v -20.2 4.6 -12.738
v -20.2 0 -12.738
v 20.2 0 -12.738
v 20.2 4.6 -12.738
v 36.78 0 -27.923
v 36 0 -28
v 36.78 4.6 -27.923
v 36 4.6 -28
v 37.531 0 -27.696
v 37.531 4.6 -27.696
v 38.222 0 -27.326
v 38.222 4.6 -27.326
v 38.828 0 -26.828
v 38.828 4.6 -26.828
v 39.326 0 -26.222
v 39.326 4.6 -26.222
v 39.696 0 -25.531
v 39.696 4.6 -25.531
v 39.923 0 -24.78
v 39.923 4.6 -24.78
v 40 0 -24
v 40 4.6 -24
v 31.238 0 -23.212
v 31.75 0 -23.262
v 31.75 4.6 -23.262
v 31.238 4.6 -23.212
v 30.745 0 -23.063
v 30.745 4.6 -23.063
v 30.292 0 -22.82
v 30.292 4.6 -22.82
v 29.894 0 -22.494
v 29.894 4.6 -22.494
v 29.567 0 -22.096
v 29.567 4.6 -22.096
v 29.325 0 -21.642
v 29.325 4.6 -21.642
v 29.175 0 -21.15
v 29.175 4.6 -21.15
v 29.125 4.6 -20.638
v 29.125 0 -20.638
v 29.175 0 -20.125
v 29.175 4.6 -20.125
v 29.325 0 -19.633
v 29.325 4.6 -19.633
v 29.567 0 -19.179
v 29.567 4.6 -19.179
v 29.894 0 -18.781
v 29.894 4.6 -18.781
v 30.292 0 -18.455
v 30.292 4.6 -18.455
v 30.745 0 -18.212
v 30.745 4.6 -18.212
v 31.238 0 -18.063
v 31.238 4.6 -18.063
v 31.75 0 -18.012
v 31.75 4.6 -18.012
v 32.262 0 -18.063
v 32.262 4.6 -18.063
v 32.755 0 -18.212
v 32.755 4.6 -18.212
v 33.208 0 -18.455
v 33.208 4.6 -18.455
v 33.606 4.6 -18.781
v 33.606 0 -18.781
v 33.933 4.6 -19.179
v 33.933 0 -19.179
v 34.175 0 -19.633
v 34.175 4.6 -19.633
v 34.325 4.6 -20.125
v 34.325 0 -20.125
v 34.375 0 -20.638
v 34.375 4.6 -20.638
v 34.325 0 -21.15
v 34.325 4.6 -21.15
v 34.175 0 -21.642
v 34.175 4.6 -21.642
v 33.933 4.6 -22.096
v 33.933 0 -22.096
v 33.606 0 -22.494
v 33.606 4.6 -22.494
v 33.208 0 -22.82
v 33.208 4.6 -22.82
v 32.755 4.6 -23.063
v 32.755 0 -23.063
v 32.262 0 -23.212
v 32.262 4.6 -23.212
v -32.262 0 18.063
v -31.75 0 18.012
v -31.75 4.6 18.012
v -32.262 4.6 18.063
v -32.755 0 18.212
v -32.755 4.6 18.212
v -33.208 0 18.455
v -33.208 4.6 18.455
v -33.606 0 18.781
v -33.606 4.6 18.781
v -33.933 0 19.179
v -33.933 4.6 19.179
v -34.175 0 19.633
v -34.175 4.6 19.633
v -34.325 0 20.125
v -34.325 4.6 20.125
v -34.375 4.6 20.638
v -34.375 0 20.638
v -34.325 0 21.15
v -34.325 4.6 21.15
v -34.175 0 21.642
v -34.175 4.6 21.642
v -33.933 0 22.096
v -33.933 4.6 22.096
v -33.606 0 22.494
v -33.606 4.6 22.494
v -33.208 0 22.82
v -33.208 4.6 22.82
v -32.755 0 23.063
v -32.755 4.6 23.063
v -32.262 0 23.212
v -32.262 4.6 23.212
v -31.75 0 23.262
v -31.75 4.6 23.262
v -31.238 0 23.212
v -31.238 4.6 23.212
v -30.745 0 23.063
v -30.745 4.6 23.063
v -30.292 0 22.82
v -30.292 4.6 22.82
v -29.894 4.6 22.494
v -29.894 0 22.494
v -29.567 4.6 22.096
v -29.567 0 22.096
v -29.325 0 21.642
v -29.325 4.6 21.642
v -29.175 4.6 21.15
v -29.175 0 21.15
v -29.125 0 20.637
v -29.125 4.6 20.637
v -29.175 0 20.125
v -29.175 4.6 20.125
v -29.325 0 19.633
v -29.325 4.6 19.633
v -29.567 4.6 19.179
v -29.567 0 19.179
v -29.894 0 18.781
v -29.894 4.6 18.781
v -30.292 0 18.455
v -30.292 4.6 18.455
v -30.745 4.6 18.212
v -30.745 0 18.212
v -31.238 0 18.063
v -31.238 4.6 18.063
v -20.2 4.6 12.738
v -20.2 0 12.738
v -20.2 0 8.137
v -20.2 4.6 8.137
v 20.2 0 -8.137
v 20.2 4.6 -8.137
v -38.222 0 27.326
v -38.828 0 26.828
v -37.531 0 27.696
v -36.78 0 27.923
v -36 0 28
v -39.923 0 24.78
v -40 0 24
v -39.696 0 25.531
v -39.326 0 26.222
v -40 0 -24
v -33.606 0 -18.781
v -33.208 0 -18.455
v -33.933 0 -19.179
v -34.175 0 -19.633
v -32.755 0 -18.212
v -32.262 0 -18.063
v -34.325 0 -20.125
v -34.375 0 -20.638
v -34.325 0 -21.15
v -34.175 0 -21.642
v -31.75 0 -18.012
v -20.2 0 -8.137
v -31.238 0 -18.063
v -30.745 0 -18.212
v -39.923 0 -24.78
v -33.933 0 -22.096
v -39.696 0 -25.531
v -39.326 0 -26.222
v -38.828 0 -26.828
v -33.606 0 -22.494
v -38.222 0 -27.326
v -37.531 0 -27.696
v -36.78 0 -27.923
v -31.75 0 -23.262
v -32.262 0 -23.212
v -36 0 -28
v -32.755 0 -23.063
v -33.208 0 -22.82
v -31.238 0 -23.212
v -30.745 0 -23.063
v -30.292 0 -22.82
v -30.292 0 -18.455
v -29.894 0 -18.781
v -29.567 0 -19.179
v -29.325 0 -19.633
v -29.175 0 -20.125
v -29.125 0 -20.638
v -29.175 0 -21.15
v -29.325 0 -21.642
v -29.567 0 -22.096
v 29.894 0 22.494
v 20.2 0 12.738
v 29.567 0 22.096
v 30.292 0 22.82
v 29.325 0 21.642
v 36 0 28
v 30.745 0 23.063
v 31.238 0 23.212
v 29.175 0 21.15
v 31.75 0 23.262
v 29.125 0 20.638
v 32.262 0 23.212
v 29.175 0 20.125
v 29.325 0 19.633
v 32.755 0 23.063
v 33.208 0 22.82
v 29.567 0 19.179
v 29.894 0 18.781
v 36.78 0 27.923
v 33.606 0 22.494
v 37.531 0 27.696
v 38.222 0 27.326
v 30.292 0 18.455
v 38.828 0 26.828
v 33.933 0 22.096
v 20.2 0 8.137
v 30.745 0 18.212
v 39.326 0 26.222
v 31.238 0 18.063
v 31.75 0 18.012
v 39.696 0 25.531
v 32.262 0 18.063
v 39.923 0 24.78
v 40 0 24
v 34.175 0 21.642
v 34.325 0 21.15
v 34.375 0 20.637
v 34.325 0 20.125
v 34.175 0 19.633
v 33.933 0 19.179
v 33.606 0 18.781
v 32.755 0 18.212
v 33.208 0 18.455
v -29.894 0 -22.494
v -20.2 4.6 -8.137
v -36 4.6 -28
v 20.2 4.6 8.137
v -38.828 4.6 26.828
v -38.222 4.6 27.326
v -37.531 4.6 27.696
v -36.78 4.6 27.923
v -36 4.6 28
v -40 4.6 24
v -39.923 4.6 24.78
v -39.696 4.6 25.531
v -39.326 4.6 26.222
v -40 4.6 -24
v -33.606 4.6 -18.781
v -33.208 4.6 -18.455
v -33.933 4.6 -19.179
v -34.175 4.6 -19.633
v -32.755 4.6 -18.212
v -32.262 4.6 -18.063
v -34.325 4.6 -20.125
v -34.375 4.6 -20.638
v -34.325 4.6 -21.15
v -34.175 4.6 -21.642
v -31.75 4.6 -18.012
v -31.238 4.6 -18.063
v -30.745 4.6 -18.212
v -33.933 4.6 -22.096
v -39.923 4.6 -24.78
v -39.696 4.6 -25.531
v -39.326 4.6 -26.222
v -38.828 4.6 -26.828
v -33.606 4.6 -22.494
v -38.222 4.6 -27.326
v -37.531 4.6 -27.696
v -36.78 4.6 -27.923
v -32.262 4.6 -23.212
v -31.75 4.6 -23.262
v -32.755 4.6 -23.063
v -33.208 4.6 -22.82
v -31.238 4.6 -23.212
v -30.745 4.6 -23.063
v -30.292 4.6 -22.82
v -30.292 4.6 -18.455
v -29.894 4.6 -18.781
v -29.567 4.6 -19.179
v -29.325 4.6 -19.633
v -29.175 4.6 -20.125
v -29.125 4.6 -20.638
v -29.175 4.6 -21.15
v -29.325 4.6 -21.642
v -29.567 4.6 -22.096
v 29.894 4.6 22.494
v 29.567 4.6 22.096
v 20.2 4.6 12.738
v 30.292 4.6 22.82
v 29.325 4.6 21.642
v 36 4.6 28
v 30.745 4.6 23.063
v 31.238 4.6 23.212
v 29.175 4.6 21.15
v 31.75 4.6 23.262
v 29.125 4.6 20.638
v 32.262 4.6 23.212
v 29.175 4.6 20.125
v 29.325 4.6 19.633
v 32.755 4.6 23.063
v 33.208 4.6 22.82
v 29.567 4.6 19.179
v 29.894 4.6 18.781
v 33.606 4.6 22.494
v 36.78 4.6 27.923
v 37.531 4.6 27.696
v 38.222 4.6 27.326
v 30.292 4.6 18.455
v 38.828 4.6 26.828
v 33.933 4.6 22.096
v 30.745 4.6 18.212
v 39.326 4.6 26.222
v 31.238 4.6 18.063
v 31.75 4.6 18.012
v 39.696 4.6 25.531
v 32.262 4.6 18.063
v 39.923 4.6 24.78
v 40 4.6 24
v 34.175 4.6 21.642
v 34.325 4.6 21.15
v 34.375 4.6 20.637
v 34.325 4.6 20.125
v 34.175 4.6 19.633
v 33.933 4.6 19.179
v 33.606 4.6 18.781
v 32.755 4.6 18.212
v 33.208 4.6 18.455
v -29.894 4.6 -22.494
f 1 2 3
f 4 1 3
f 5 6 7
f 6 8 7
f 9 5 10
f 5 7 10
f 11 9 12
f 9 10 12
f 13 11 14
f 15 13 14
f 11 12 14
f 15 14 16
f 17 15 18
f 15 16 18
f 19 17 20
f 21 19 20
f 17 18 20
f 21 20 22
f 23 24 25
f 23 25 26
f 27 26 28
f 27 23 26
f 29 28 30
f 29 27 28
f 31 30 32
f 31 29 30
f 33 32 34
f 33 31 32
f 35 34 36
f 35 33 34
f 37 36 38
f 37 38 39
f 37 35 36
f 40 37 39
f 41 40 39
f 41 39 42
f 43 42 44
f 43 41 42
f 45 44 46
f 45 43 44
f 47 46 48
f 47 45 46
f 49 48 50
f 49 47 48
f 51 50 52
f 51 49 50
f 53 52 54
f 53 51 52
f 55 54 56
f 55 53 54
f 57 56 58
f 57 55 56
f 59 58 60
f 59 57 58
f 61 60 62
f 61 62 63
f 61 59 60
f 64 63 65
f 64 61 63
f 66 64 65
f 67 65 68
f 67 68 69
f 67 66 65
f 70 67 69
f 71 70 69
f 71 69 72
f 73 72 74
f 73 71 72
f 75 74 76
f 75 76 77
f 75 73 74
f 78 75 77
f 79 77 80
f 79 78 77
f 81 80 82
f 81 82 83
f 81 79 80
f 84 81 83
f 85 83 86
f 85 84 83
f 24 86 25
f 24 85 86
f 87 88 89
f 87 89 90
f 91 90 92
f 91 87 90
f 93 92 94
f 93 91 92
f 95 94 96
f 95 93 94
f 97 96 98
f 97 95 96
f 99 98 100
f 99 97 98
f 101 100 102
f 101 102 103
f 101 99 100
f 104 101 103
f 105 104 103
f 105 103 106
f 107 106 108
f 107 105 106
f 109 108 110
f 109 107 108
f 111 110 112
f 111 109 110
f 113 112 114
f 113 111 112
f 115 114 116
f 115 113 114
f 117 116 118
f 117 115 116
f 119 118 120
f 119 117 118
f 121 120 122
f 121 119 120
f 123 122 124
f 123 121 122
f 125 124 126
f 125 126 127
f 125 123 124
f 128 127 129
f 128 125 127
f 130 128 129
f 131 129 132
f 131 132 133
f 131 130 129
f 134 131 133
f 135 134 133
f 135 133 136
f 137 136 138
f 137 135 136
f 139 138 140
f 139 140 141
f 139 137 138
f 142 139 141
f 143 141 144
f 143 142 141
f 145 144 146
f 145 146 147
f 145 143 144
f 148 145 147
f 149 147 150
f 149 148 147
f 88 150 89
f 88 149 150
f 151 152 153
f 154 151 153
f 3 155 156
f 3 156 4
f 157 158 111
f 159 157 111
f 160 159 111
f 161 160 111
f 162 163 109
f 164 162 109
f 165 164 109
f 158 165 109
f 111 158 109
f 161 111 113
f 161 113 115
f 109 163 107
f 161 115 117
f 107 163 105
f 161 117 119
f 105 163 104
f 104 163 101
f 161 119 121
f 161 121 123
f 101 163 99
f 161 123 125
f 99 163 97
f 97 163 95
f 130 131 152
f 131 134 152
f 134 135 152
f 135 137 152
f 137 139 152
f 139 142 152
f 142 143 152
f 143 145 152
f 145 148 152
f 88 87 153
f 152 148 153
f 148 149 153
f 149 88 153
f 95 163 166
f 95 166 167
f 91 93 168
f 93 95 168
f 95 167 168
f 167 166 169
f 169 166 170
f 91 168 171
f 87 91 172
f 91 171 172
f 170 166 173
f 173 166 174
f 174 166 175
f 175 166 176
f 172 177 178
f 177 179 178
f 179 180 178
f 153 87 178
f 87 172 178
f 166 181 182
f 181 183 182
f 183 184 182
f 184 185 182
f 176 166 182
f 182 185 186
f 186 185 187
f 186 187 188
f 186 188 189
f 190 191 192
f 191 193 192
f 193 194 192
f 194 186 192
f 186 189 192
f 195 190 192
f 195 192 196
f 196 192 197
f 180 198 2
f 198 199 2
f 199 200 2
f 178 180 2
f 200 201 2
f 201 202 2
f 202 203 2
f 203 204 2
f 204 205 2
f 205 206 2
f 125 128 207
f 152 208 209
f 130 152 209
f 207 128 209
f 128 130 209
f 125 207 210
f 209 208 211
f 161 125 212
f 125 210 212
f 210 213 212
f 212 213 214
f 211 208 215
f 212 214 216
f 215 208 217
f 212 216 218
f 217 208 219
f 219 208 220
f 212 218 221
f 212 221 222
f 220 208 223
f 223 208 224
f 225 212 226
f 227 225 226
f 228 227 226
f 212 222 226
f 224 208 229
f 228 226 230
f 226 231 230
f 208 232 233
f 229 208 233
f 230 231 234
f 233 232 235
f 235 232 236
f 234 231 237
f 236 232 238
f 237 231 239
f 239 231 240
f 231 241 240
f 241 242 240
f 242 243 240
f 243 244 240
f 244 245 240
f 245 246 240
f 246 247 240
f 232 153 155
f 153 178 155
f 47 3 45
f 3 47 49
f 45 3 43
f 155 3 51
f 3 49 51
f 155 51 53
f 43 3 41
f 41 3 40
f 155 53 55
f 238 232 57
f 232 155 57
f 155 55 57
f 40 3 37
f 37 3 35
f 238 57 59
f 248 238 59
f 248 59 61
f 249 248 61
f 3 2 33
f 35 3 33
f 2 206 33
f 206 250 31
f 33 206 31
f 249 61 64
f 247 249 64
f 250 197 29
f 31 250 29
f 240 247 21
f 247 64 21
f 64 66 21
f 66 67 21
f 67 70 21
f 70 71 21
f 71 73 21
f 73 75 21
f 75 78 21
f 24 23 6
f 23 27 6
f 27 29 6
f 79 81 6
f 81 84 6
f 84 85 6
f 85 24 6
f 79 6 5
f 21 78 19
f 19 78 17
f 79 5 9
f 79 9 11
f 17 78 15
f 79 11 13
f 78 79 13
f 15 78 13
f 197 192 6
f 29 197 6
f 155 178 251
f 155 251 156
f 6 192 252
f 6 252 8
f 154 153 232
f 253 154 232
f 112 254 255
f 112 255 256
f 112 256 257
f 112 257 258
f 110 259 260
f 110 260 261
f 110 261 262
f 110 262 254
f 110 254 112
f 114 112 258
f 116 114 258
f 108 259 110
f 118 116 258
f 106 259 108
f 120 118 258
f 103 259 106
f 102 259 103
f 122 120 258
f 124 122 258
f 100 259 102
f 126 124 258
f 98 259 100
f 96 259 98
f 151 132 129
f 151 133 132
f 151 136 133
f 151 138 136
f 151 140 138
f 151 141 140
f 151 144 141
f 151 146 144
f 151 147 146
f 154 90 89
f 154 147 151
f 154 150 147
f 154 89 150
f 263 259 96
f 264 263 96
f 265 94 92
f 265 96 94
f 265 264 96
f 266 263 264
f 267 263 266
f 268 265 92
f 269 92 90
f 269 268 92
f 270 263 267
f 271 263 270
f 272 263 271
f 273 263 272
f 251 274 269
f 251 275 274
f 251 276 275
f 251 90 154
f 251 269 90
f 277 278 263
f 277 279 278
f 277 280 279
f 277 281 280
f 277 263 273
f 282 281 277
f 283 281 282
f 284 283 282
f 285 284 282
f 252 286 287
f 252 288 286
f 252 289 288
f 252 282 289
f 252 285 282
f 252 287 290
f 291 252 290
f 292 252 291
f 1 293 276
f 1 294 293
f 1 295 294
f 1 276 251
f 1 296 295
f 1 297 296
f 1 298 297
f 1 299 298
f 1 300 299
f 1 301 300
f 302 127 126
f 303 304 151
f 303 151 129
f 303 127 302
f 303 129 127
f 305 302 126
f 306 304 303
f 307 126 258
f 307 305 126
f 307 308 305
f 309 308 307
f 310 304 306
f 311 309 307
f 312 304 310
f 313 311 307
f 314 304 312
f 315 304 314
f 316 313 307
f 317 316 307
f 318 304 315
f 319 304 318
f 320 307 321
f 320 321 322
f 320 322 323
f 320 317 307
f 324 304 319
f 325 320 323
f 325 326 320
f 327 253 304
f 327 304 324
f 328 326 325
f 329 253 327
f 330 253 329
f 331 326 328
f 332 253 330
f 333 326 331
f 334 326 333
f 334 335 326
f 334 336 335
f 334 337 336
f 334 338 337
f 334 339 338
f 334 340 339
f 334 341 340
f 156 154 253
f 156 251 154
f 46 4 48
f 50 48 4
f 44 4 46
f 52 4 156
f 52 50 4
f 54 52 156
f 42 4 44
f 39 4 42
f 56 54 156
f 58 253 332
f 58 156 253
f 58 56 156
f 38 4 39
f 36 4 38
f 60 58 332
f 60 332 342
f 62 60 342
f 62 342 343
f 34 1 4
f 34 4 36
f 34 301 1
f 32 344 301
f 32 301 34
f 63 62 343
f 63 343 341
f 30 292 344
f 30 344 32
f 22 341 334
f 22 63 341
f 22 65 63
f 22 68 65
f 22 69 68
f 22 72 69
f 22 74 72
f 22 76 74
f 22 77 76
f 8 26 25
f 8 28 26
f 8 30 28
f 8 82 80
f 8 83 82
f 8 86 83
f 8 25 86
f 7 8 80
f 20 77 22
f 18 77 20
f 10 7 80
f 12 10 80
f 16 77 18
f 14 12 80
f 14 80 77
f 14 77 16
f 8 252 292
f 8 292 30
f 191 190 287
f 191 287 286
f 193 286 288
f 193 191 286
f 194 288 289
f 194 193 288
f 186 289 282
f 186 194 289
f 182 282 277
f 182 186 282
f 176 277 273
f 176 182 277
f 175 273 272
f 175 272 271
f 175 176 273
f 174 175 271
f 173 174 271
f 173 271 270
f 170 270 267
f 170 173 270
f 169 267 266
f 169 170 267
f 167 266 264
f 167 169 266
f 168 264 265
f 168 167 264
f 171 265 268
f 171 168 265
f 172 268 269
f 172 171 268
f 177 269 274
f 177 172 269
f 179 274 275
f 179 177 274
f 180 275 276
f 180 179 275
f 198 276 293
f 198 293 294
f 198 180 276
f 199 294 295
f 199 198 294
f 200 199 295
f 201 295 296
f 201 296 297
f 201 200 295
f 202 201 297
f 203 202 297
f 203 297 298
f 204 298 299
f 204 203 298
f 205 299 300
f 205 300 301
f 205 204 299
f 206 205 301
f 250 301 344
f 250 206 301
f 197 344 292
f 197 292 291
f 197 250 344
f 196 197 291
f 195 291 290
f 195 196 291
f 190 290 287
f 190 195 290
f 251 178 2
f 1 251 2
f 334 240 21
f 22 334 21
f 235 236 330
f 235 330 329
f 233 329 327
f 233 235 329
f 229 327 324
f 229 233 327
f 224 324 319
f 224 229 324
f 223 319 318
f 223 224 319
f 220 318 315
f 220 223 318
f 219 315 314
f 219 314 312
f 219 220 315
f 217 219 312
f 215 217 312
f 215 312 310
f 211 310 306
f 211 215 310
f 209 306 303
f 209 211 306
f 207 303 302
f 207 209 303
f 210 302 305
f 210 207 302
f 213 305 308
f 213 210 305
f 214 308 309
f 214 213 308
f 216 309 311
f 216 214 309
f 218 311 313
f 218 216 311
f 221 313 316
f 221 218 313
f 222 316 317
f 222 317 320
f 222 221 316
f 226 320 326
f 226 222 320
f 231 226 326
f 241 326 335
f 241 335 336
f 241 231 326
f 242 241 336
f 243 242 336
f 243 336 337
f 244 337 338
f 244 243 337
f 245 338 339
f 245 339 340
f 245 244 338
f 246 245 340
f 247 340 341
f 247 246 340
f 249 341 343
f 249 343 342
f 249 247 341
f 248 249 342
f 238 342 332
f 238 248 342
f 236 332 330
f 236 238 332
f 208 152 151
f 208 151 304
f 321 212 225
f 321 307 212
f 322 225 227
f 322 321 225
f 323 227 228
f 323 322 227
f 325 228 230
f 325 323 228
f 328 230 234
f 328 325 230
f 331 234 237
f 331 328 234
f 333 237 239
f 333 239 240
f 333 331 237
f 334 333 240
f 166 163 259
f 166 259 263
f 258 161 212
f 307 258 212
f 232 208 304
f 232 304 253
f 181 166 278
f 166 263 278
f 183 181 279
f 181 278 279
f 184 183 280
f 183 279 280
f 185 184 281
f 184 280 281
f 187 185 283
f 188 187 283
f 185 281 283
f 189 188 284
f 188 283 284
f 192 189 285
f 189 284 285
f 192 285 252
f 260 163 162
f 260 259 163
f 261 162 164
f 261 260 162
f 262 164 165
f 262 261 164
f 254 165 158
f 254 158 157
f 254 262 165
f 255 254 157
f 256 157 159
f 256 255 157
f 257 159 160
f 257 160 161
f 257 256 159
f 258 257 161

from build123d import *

# Parameters (mm, degrees)
SKETCH_3_W          = 80
SKETCH_3_H          = 56
EXTRUDE_1_DEPTH     = 4.6
SKETCH_1_R          = 2.625
SKETCH_1_W          = 40.4
SKETCH_1_H          = 4.6
CUT_EXTRUDE_1_DEPTH = 4.6
FILLET_2_R          = 4


with BuildPart() as part:
    # 草图3 → 凸台-拉伸1 (new body)
    with BuildSketch(Plane(origin=(0, 0, 0), x_dir=(1, 0, 0), z_dir=(0, 1, 0))):
        Rectangle(SKETCH_3_W, SKETCH_3_H)
    extrude(amount=EXTRUDE_1_DEPTH)

    # 草图1 → 切除-拉伸1 (cut)
    with BuildSketch(Plane(origin=(0, 0, 0), x_dir=(1, 0, 0), z_dir=(0, 1, 0))):
        with Locations(Location((-31.75, 20.6375, 0), (0, 0, 90))):
            Circle(SKETCH_1_R)
        with Locations(Location((31.75, 20.6375, 0), (0, 0, 90))):
            Circle(SKETCH_1_R)
        with Locations(Location((31.75, -20.6375, 0), (0, 0, 90))):
            Circle(SKETCH_1_R)
        with Locations(Location((-31.75, -20.6375, 0), (0, 0, 90))):
            Circle(SKETCH_1_R)
        with Locations((0, -10.4375)):
            Rectangle(SKETCH_1_W, SKETCH_1_H)
        with Locations((0, 10.4375)):
            Rectangle(SKETCH_1_W, SKETCH_1_H)
    extrude(amount=CUT_EXTRUDE_1_DEPTH, mode=Mode.SUBTRACT)

    # 圆角2
    fillet_2_edges = [part.edges().sort_by_distance(p)[0] for p in [
        (40, 2.3, 28),
        (-40, 2.3, 28),
        (-40, 2.3, -28),
        (40, 2.3, -28),
    ]]
    fillet(fillet_2_edges, radius=FILLET_2_R)


solid = part.part
